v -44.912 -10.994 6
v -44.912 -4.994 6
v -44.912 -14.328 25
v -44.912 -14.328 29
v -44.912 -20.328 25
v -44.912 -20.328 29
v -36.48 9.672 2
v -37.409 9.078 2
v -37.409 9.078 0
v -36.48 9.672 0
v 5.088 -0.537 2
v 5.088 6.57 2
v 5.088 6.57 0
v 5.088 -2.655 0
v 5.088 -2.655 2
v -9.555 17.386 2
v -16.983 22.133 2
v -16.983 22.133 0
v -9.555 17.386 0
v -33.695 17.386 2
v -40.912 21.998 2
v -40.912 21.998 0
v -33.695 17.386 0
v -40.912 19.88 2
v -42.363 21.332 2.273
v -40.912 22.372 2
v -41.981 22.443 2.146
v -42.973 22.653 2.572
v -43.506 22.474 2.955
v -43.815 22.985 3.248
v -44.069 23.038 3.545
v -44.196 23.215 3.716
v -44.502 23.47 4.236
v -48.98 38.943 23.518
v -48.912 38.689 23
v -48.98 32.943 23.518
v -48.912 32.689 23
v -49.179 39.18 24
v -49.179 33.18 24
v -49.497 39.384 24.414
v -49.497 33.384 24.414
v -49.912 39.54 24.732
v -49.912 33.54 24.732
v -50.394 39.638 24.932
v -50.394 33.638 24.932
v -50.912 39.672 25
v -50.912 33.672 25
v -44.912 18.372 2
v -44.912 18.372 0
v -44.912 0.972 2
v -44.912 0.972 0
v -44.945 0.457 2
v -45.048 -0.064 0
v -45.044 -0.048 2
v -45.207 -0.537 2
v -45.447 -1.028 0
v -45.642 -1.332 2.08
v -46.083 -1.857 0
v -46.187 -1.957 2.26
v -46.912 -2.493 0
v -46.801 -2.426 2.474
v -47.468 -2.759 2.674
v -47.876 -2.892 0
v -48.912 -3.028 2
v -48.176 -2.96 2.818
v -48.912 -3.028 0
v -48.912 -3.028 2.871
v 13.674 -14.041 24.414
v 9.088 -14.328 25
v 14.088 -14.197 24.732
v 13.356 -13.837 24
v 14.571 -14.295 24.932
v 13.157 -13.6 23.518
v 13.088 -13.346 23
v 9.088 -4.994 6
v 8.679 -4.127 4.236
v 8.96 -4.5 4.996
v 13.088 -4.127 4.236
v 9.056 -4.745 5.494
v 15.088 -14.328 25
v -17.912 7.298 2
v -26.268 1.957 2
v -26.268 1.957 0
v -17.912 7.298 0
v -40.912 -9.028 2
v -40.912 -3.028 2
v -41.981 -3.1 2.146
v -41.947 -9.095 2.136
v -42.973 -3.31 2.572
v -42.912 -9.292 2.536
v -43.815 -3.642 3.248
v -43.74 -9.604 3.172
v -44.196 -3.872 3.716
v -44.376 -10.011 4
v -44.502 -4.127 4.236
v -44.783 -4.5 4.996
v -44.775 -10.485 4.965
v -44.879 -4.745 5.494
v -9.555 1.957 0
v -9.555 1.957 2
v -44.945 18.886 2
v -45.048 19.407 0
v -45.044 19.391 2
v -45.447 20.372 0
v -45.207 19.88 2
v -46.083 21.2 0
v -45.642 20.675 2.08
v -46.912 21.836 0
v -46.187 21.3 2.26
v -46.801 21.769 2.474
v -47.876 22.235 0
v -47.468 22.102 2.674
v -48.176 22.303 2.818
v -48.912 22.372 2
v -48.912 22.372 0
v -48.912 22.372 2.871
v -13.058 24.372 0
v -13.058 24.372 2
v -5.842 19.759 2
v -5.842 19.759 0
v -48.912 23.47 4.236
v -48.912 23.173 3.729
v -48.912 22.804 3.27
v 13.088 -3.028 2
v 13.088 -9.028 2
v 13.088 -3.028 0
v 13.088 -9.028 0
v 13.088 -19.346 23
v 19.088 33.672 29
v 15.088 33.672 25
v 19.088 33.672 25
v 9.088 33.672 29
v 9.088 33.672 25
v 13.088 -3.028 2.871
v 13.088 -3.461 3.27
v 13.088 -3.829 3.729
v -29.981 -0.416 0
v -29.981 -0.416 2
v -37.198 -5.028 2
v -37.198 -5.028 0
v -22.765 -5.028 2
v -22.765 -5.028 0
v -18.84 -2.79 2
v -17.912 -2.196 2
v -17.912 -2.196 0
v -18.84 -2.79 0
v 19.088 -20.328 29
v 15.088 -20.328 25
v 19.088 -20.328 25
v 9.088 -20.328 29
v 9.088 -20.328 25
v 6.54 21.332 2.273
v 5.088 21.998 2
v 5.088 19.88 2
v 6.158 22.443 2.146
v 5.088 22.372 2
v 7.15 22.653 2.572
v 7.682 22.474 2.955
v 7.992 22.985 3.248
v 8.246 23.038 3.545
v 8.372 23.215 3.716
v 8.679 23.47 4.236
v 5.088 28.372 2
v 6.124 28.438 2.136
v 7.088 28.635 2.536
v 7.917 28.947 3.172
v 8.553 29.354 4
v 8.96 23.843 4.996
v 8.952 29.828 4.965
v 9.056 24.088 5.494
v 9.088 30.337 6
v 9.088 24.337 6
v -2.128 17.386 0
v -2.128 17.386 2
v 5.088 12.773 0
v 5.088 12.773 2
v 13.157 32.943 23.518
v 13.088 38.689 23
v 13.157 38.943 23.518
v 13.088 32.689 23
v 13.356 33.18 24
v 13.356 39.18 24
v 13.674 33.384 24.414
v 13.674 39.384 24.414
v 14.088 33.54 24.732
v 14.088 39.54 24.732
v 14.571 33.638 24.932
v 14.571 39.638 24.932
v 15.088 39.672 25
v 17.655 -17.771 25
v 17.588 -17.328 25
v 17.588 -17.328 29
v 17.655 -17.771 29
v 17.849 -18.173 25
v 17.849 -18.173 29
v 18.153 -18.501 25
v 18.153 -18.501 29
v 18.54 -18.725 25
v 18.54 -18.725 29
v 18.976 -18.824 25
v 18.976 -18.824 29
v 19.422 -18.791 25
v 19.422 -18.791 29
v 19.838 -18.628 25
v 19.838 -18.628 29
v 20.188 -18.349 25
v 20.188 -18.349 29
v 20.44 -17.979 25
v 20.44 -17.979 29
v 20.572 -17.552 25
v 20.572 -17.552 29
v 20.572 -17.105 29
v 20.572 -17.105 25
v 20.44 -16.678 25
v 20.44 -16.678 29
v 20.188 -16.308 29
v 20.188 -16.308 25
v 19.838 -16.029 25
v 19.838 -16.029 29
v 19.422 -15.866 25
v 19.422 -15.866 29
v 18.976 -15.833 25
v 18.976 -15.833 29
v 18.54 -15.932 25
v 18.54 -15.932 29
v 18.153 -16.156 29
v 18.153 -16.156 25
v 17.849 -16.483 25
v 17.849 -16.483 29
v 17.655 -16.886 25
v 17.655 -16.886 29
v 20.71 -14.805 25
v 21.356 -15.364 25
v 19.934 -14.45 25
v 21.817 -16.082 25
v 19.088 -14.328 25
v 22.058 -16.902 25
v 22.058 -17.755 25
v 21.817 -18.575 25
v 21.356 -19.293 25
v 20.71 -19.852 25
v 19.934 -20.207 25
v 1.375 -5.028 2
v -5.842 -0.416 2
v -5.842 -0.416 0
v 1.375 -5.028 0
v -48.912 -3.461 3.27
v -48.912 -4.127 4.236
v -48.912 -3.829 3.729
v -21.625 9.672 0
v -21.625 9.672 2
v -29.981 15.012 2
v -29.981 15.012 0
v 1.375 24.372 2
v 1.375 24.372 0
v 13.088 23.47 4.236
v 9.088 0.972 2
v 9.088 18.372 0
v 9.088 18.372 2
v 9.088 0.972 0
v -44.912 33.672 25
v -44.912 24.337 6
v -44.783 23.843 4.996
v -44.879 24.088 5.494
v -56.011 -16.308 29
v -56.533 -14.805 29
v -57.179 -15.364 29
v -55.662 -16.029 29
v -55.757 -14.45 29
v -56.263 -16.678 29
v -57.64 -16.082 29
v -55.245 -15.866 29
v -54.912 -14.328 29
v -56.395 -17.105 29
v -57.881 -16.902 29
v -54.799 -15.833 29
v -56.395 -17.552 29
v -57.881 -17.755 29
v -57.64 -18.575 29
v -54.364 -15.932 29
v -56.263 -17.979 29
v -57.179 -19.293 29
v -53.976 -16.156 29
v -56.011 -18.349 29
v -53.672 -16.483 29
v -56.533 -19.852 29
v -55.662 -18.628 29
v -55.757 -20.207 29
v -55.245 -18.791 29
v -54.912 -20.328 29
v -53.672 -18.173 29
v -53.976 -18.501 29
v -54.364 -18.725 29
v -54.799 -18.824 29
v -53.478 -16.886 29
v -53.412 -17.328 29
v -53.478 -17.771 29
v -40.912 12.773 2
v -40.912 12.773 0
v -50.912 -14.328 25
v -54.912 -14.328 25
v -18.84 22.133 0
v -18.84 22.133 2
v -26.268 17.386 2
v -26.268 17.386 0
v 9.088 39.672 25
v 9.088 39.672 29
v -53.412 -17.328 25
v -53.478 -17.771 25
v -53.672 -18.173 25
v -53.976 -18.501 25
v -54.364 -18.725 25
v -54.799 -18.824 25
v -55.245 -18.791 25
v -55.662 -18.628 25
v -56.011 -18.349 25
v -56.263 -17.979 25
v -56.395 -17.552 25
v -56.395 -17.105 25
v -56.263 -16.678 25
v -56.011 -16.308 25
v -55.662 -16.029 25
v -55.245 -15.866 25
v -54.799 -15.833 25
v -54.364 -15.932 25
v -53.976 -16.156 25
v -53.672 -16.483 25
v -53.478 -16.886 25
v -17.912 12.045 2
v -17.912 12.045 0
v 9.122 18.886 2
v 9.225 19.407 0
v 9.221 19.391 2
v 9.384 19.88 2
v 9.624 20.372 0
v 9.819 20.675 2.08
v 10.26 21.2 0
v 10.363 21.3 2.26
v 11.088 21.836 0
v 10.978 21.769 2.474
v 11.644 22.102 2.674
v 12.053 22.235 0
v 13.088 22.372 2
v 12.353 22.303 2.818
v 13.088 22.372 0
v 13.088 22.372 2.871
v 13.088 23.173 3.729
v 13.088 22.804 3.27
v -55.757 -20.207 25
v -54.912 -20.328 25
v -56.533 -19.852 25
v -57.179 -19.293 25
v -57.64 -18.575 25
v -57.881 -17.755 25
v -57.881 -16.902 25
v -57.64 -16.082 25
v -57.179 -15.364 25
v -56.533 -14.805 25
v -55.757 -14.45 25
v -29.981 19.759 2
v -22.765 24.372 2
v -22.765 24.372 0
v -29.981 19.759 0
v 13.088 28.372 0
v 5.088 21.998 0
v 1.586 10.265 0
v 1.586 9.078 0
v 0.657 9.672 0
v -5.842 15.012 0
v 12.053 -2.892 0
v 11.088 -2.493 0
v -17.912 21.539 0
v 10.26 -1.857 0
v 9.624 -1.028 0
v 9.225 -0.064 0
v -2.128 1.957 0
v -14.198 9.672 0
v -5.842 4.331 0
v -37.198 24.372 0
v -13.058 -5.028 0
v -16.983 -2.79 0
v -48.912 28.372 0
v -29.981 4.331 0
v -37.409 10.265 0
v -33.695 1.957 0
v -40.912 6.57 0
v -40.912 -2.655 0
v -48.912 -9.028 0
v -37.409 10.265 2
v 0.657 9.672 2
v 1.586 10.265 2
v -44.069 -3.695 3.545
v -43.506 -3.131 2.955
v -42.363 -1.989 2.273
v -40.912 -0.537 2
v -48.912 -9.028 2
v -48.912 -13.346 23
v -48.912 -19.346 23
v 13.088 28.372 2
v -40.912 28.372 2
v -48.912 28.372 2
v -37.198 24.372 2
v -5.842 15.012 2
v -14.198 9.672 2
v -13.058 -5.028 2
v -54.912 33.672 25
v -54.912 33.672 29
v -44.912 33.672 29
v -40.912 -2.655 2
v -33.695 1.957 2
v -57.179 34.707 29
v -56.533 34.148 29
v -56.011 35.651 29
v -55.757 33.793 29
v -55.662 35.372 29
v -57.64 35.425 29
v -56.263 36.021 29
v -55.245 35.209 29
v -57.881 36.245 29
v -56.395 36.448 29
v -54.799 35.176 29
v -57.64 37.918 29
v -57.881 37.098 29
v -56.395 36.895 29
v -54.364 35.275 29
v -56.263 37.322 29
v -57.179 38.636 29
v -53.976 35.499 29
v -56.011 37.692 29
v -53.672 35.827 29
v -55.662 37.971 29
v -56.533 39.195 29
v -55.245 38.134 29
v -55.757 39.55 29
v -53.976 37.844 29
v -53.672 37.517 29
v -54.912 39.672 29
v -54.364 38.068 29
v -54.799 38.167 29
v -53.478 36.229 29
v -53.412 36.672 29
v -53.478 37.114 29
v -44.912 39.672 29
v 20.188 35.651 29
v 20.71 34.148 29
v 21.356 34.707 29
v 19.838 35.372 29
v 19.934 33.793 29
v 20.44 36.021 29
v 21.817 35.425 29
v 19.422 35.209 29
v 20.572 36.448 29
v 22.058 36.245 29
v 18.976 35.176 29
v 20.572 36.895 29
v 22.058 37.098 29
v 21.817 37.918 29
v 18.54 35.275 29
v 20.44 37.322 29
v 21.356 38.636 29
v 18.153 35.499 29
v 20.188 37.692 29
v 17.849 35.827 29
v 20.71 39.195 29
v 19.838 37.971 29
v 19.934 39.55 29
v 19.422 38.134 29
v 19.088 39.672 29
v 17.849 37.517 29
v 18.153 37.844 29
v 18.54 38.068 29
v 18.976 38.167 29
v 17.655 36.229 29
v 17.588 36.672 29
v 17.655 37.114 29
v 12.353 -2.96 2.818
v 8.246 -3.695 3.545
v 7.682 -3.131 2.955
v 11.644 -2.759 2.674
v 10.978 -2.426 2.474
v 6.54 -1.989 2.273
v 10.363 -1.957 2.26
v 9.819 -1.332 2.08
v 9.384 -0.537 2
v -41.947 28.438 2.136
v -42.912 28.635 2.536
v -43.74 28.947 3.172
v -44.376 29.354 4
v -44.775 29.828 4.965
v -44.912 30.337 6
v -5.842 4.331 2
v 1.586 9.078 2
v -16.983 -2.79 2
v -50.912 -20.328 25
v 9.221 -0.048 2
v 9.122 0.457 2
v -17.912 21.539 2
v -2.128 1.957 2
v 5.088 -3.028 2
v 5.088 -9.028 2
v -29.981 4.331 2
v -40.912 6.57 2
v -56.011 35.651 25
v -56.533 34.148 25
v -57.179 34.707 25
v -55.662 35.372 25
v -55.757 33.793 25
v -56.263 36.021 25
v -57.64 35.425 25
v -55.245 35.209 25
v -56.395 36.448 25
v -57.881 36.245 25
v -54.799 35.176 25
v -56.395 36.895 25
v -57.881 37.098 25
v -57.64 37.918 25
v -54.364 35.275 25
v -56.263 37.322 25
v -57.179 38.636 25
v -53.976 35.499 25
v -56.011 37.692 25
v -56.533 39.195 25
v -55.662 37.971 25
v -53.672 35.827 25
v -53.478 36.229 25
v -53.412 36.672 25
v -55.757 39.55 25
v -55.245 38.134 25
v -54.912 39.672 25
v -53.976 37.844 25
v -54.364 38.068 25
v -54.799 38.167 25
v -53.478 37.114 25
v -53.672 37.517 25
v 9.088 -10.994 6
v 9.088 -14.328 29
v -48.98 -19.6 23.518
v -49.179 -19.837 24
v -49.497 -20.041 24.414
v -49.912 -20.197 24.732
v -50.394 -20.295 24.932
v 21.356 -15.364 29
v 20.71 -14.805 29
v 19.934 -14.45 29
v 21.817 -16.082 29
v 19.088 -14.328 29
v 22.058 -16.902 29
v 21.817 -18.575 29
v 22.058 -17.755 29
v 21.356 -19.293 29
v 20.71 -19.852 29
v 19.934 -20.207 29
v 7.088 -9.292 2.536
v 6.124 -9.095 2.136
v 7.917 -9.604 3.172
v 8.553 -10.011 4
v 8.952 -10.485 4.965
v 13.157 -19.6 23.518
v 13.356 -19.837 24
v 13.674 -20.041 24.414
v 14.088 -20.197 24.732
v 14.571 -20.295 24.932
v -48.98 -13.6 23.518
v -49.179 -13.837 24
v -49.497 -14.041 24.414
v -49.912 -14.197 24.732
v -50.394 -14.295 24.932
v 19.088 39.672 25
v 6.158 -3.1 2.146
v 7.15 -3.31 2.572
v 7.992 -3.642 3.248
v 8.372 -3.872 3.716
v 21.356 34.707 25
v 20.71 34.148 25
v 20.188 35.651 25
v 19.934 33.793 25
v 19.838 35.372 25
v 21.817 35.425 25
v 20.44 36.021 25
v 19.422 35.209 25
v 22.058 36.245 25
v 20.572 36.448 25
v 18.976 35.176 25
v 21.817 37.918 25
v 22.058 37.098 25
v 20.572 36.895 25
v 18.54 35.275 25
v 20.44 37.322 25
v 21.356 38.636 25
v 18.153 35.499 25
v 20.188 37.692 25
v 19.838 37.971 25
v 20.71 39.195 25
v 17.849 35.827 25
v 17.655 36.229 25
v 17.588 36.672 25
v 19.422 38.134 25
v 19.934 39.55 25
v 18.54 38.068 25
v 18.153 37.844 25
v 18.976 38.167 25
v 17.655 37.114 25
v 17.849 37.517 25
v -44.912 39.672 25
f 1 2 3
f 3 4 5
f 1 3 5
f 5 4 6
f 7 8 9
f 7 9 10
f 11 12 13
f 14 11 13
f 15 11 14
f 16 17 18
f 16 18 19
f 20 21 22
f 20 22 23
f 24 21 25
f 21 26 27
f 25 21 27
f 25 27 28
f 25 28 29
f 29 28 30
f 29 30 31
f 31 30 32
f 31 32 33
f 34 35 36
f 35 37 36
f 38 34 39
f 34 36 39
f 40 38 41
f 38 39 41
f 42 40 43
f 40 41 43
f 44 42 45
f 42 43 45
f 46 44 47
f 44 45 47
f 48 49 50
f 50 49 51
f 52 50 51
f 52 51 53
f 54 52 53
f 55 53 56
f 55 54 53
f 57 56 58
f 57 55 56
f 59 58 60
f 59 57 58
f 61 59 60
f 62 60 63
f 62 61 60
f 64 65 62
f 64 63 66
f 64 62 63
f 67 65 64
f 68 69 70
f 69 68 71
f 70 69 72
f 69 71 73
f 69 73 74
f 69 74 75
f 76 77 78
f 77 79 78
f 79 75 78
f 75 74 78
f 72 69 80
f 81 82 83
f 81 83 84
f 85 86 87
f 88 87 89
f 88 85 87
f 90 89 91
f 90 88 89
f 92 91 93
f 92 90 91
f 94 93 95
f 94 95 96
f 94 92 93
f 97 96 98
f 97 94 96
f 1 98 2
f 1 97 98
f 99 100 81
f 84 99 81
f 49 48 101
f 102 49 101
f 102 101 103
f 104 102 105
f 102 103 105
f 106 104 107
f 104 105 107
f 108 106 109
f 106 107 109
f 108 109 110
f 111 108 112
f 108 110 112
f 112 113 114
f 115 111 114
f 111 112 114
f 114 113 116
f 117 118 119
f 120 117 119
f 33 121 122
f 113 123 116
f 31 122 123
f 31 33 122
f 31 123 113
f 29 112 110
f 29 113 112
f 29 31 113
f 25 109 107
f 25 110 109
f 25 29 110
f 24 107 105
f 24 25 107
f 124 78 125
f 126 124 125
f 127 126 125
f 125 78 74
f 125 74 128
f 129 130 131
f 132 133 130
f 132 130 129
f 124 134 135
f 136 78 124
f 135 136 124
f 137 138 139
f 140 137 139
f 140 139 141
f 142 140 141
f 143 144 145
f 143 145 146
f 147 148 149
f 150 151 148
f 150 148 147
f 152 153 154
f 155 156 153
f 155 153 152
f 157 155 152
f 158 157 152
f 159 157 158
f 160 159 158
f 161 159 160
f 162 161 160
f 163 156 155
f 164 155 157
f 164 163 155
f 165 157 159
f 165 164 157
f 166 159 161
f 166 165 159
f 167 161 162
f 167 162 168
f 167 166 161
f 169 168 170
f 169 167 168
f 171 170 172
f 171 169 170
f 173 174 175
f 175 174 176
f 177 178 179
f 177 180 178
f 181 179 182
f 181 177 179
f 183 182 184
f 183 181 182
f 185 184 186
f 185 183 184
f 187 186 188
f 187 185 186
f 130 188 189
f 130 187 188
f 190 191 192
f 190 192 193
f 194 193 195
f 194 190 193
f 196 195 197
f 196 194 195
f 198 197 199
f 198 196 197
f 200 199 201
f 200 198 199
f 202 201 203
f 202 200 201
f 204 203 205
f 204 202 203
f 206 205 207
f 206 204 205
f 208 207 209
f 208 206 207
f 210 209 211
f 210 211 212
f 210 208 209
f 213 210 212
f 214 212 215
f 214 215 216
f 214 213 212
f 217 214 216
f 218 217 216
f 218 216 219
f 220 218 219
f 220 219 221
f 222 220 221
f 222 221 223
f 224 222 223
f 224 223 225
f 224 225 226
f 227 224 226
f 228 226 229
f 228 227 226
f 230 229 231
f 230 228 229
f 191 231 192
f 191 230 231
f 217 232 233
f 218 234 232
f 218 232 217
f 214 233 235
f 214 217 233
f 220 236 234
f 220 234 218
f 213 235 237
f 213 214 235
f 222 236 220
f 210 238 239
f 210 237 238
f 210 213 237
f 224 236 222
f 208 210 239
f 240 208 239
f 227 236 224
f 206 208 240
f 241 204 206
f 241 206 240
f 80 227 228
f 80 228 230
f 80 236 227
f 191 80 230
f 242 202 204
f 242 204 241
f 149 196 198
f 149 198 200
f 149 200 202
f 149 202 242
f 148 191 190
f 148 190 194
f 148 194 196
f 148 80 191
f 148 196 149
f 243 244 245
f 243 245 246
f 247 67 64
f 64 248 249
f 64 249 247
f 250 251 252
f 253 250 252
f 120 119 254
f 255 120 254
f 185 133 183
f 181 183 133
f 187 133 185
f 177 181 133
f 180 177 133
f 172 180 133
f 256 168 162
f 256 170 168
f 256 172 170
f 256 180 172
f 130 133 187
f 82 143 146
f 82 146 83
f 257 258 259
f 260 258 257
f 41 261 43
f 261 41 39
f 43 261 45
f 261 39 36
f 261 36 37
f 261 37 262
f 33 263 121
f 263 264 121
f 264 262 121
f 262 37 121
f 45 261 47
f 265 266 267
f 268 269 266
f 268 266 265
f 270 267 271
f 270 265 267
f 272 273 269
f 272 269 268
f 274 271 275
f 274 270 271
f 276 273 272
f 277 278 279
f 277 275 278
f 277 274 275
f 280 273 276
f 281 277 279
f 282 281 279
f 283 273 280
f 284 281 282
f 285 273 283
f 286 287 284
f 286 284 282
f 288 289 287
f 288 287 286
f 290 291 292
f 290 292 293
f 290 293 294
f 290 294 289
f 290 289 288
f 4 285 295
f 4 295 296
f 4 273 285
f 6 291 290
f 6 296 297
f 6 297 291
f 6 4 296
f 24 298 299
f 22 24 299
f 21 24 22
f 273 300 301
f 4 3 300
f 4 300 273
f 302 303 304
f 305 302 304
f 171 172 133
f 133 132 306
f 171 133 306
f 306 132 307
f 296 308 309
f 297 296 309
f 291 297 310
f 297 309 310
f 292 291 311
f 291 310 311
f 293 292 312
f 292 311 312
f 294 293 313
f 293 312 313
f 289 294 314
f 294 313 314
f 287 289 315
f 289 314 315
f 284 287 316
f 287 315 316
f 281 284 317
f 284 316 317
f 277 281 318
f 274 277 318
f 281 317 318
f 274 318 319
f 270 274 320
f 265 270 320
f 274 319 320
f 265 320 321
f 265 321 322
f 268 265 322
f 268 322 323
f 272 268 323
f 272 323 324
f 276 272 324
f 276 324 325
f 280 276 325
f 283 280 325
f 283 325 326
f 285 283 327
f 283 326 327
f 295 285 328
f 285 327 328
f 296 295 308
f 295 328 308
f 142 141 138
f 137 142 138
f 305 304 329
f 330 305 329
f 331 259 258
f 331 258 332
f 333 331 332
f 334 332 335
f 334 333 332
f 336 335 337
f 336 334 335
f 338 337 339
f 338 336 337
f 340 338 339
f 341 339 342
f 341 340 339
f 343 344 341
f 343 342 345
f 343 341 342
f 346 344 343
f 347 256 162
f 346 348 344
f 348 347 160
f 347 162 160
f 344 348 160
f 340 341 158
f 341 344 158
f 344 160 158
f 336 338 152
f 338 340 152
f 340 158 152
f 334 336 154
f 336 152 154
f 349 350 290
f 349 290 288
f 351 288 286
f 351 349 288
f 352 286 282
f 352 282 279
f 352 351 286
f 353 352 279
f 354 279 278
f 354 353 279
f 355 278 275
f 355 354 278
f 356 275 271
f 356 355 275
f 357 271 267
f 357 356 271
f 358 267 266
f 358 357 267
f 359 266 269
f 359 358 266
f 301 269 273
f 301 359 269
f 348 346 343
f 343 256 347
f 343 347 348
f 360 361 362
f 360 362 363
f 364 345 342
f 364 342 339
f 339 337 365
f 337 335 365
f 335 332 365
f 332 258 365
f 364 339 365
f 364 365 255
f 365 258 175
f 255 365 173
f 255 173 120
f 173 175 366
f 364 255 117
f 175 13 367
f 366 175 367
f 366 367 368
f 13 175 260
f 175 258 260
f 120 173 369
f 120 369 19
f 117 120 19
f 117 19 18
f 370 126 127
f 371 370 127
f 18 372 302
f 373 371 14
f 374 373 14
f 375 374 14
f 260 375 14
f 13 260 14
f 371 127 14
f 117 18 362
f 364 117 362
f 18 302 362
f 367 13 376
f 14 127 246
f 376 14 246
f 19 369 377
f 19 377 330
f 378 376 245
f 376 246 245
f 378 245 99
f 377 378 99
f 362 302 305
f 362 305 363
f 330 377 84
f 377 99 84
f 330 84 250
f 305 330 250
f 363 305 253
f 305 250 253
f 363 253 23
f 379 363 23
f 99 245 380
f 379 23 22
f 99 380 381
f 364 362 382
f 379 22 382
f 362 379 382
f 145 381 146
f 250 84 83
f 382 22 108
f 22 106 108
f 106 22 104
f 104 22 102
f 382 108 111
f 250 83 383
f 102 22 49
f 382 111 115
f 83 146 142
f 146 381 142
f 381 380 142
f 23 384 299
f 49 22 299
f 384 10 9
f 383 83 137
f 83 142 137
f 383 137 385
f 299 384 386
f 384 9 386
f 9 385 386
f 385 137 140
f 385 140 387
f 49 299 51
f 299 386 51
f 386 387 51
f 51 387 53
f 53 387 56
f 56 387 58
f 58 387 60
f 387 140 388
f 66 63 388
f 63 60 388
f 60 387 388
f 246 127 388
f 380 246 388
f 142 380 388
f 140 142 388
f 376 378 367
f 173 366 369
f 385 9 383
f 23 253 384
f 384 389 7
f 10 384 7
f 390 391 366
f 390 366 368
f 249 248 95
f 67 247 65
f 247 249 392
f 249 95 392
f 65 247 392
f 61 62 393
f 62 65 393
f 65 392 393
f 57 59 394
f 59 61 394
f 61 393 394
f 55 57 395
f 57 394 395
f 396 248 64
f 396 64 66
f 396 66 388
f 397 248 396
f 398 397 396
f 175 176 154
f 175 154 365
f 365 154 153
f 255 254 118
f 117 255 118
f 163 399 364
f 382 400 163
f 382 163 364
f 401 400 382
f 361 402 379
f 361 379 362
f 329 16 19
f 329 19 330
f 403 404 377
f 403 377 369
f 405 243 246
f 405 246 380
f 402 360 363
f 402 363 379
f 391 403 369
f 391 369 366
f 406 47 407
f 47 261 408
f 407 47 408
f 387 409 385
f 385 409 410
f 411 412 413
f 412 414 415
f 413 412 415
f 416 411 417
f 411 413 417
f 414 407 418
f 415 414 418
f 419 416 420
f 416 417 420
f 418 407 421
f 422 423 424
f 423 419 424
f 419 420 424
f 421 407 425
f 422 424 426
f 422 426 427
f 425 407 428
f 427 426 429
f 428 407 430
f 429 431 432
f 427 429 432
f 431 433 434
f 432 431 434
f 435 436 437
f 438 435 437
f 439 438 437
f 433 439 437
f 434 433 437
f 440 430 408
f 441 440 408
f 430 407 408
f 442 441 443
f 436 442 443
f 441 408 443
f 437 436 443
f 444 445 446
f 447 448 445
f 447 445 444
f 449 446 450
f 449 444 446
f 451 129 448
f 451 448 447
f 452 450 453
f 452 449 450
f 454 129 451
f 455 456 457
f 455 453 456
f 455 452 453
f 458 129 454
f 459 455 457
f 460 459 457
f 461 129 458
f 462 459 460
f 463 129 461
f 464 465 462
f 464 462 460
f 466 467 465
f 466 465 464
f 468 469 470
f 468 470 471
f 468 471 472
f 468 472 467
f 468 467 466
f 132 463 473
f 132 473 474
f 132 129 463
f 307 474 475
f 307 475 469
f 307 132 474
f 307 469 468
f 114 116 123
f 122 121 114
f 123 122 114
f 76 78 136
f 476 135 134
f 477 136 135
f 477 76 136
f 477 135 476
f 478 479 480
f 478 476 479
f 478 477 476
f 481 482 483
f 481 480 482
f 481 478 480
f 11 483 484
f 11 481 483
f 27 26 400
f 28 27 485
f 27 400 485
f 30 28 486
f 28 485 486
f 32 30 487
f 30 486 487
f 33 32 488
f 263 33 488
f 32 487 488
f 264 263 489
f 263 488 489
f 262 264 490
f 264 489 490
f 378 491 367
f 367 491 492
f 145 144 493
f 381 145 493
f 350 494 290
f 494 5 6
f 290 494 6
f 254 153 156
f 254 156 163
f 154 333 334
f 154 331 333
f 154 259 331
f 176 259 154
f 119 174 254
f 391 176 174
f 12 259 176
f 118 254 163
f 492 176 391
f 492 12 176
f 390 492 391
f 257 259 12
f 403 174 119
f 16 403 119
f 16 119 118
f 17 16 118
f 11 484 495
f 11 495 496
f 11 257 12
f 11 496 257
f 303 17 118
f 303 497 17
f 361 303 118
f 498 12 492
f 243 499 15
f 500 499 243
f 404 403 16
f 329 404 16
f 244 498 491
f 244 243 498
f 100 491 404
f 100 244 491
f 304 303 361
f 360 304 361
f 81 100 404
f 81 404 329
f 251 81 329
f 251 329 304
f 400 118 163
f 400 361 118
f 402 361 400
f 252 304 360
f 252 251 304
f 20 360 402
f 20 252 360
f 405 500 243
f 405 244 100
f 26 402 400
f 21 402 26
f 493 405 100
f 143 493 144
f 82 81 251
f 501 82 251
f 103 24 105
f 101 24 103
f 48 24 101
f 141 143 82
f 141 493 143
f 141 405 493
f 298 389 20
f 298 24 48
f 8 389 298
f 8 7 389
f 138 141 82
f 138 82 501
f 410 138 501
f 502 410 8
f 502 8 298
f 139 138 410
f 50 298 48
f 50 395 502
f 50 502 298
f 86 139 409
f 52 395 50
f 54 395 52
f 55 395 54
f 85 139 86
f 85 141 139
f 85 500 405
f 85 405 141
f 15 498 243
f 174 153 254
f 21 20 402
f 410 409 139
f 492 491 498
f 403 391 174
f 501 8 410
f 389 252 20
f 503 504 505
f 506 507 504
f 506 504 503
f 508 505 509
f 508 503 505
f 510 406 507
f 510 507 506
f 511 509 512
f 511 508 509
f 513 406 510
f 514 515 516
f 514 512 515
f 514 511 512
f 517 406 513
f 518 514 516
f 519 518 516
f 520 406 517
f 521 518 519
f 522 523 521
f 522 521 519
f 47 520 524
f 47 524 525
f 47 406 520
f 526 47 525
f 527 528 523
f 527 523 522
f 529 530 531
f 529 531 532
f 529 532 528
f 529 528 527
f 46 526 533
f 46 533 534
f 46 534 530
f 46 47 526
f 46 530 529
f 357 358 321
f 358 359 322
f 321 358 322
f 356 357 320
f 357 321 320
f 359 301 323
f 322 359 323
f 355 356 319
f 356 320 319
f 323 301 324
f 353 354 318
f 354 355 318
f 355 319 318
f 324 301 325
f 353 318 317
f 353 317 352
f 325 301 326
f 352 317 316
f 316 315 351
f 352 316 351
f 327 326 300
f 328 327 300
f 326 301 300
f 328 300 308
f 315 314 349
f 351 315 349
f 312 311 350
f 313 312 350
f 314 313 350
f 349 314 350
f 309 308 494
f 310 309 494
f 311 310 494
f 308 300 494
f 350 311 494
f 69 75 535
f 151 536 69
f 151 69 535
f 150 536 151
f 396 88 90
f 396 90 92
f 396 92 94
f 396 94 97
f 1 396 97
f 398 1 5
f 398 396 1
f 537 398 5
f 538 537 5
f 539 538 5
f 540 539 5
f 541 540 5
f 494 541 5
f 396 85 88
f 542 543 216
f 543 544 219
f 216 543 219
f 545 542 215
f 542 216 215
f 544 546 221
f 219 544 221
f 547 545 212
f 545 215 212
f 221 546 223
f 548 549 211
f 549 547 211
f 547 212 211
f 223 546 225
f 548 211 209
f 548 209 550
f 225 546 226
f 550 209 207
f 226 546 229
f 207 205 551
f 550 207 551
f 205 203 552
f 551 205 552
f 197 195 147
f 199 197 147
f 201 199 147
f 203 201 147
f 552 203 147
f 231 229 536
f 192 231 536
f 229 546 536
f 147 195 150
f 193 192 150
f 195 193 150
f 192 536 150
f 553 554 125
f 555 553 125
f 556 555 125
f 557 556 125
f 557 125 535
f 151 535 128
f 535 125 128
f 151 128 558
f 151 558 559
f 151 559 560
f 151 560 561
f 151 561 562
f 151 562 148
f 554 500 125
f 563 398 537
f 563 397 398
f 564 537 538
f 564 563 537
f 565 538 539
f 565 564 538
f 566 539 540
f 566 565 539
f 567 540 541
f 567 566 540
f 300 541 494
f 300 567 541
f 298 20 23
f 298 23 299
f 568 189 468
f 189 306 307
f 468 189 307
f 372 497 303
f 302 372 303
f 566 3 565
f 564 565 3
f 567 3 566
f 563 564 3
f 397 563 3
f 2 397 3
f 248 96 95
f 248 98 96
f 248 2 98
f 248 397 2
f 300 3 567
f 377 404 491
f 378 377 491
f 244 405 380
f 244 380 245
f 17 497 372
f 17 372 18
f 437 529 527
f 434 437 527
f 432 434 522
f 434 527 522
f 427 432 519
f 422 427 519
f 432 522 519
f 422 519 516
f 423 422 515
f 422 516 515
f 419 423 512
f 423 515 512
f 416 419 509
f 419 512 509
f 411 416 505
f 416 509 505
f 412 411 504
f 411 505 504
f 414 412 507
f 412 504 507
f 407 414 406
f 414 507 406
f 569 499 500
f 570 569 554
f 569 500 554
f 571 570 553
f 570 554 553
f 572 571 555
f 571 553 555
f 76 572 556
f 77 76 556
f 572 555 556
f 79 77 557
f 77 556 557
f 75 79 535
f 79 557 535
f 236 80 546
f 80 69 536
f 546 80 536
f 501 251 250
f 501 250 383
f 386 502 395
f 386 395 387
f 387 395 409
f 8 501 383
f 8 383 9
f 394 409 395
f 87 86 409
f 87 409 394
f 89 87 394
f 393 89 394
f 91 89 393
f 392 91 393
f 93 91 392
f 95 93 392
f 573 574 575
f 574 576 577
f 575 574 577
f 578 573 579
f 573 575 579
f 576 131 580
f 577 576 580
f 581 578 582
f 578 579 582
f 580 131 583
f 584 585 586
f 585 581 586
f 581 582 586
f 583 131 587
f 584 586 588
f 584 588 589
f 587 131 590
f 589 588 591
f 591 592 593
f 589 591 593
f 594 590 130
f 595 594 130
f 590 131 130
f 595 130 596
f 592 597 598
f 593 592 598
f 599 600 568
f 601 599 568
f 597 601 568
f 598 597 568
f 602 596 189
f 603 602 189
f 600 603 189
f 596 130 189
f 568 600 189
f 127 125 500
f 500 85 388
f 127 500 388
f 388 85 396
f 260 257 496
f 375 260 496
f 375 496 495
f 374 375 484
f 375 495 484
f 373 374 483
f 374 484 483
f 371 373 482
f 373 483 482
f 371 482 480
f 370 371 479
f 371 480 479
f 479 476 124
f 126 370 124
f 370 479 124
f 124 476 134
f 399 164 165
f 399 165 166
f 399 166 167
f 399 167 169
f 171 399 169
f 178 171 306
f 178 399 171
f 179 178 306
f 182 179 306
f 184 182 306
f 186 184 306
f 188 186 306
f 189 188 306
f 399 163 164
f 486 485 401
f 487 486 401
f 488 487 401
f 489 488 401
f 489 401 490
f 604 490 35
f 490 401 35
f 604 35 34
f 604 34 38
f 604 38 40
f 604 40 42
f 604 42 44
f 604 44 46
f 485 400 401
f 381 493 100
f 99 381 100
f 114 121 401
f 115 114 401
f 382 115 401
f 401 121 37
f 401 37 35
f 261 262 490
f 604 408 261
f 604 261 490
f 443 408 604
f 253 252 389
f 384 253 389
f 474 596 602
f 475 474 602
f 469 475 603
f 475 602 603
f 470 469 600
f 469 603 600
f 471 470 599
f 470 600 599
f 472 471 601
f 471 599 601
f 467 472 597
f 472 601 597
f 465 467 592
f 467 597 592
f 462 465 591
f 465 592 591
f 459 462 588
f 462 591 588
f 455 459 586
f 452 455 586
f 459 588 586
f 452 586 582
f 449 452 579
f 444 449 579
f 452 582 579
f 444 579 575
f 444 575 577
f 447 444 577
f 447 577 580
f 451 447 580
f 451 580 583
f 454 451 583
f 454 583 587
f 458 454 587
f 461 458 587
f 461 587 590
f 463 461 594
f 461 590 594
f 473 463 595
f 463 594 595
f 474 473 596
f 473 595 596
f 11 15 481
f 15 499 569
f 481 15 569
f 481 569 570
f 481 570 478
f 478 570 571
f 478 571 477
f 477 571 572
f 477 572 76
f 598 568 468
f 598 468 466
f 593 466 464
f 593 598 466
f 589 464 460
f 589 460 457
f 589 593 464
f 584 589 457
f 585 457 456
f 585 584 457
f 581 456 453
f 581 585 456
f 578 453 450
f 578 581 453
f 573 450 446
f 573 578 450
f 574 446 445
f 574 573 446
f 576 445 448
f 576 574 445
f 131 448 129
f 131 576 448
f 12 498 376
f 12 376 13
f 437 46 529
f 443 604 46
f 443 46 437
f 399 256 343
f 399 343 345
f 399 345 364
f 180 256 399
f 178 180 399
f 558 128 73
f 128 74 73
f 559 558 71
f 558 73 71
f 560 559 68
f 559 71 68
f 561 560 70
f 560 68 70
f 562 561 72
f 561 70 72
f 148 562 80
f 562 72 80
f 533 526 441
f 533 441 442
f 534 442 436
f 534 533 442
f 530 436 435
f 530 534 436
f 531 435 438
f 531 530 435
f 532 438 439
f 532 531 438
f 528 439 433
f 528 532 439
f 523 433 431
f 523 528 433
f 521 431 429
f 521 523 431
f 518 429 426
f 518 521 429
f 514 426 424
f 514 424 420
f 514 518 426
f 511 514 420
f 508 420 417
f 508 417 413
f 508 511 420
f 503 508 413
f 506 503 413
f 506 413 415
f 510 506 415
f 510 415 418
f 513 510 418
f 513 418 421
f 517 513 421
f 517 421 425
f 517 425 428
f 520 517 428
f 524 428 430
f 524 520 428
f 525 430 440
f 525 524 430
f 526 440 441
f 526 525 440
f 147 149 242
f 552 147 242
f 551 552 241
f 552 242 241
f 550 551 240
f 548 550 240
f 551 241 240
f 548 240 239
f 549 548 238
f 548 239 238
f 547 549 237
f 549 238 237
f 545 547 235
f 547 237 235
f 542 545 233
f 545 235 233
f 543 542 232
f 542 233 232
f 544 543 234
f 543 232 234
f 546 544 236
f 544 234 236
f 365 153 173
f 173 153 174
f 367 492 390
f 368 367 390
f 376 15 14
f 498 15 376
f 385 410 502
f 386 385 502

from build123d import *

# Parameters (mm, degrees)
SKETCH1_W                = 54
SKETCH1_H                = 37.4
BOSS_EXTRUDE1_DEPTH      = 2
CUT_EXTRUDE1_DEPTH       = 54.160020758
SKETCH4_R                = 3
SKETCH4_R_2              = 1.5
BOSS_EXTRUDE2_DEPTH      = 4
BOSS_EXTRUDE3_REACH      = 75.013
BOSS_EXTRUDE3_END_RADIUS = 3
SKETCH6_W                = 4
SKETCH6_H                = 6
LOFT1_START              = -48.911518112
LOFT1_DEPTH              = 4
SKETCH8_2_W              = 4
SKETCH8_2_H              = 6
BOSS_EXTRUDE4_DEPTH      = 2
FILLET5_R                = 2
FILLET1_R                = 4
FILLET2_R                = 4
FILLET3_R                = 4
INTERSECT1_START         = -9.028476462
INTERSECT1_OUTLINE_W     = 54
INTERSECT1_OUTLINE_H     = 2
INTERSECT1_DEPTH         = 18.7
INTERSECT2_START         = -17.911518112
INTERSECT2_OUTLINE_W     = 18.7
INTERSECT2_OUTLINE_H     = 2
INTERSECT2_DEPTH         = 27


# Read off the part's stored shape, not the designer's step: Loft1, Intersect1, Intersect2
with BuildPart() as part:
    # Sketch1 → Boss-Extrude1 (new body)
    with BuildSketch(Plane.XY):
        with Locations((-17.911518112, 9.671523538)):
            Rectangle(SKETCH1_W, SKETCH1_H)
    extrude(amount=BOSS_EXTRUDE1_DEPTH)

    # Sketch2 → Cut-Extrude1 (cut, through all)
    with BuildSketch(Plane.XY.offset(2)):
        Polygon((-22.764922959, 24.371523538), (-29.981326879, 19.759300163), (-37.197730799, 24.371523538), align=None)
        Polygon((-33.695114192, 17.385705663), (-40.911518112, 12.773482289), (-40.911518112, 21.997929038), align=None)
        Polygon((-29.981326879, 15.012111163), (-37.408901505, 10.264922163), (-29.052880051, 4.924334538), (-21.625305425, 9.671523538), align=None)
        Polygon((-18.83996494, 22.132894663), (-26.267539566, 17.385705663), (-17.911518112, 12.045118038), (-10.483943486, 16.792307038), align=None)
        Polygon((1.374694575, 24.371523538), (-14.915006921, 24.371523538), (-6.770156173, 19.165901538), align=None)
        Polygon((-3.05636886, 16.792307038), (5.088481888, 11.586685039), (5.088481888, 21.997929038), align=None)
        Polygon((-6.770156173, 14.418712538), (-14.197730799, 9.671523538), (-5.841709344, 4.330935913), (1.585865282, 9.078124913), align=None)
        Polygon((-17.911518112, 7.297929038), (-25.339092738, 2.550740038), (-16.983071283, -2.789847587), (-9.555496657, 1.957341413), align=None)
        Polygon((-29.052880051, 0.177145538), (-20.908029303, -5.028476462), (-37.197730799, -5.028476462), align=None)
        Polygon((-40.911518112, 7.756362038), (-32.766667364, 2.550740038), (-40.911518112, -2.654881962), align=None)
        Polygon((-13.058113264, -5.028476462), (-5.841709344, -0.416253087), (1.374694575, -5.028476462), align=None)
        Polygon((-2.127922031, 1.957341413), (5.088481888, 6.569564788), (5.088481888, -2.654881962), align=None)
    extrude(amount=-CUT_EXTRUDE1_DEPTH, mode=Mode.SUBTRACT)



with BuildPart() as body_2:
    # Sketch4 → Boss-Extrude2 (new body)
    with BuildSketch(Plane.XY.offset(25)):
        with Locations((-54.911518112, 36.671523538)):
            Circle(SKETCH4_R)
        with Locations((-54.911518112, 36.671523538)):
            Circle(SKETCH4_R_2, mode=Mode.SUBTRACT)
    extrude(amount=BOSS_EXTRUDE2_DEPTH)

    # Boss-Extrude3: up to this cylinder (the profile starts outside it)
    boss_extrude3_end = Plane(origin=(-54.911518112, 36.671523538, 27), z_dir=(0, 0, -1)) * Cylinder(BOSS_EXTRUDE3_END_RADIUS, 157.026, mode=Mode.PRIVATE)
    # Sketch6 → Boss-Extrude3 (add, up to the surface)
    with BuildSketch(Plane.ZY.offset(44.911518112), mode=Mode.PRIVATE) as boss_extrude3_sk1:
        with Locations((27, 36.671523538)):
            Rectangle(SKETCH6_W, SKETCH6_H)
    boss_extrude3_tool1 = extrude(boss_extrude3_sk1.sketch, amount=BOSS_EXTRUDE3_REACH, mode=Mode.PRIVATE) - boss_extrude3_end
    add(boss_extrude3_tool1.solids().sort_by_distance((-44.911518, 36.671524, 27))[0])

    # Loft1 outline → Loft1 (add)
    with BuildSketch(Plane.YZ.offset(LOFT1_START)):
        Polygon((22.371523538, 2), (28.371523538, 2), (39.671523538, 25), (33.671523538, 25), align=None)
    extrude(amount=LOFT1_DEPTH)


with BuildPart() as part_1:
    add(part.part)

    add(body_2.part)  # Boss-Extrude4 merges body 2
    # Sketch8<2> → Boss-Extrude4 (add)
    with BuildSketch(Plane.XY.offset(2)):
        with Locations((-46.911518112, 25.371523538)):
            Rectangle(SKETCH8_2_W, SKETCH8_2_H)
    extrude(amount=-BOSS_EXTRUDE4_DEPTH)

    # Fillet5
    fillet5_edges = [part_1.edges().sort_by_distance(p)[0] for p in [
        (-48.911518112, 36.671523538, 25),
    ]]
    fillet(fillet5_edges, radius=FILLET5_R)

    # Fillet1
    # the kernel refuses this fillet: 4 mm, written as the material it adds along each edge
    with BuildSketch(Plane(origin=(-44.911518112, 22.371523538, 2), x_dir=(-1, 0, 0), z_dir=(0, 0, -1))) as fillet1_piece_1:
        with BuildLine():
            CenterArc((FILLET1_R, -FILLET1_R), FILLET1_R, 90, 90)
            Line((0, -FILLET1_R), (0, 0))
            Line((0, 0), (FILLET1_R, 0))
        make_face()
    extrude(amount=2)

    # Fillet2
    fillet2_edges = [part_1.edges().sort_by_distance(p)[0] for p in [
        (-44.911518112, 25.371523538, 2),
    ]]
    fillet(fillet2_edges, radius=FILLET2_R)

    # Fillet3
    # the kernel refuses this fillet: 4 mm, written as the material it adds along each edge
    with BuildSketch(Plane(origin=(-40.911518112, 22.371523538, 2), x_dir=(-1.1887379968908428e-11, -1.0, 0), z_dir=(-1.0, 1.188737996890843e-11, 0))) as fillet3_piece_1_section:
        with BuildLine():
            CenterArc((FILLET3_R * 0.622867973762, FILLET3_R), FILLET3_R, 206.165087136, 63.834912864)
            Line((-FILLET3_R * 0.274659258448, FILLET3_R * 0.559040968523), (0, 0))
            Line((0, 0), (FILLET3_R * 0.622867973762, 0))
        make_face()
    fillet3_piece_1 = extrude(amount=8, mode=Mode.PRIVATE)
    fillet3_piece_1 = fillet3_piece_1 - Plane(origin=(-48.911518112, 18.371523538, 2.009489355), x_dir=(-1, 0, 0), z_dir=(0, 0, 1)) * Cylinder(4, 26, mode=Mode.PRIVATE)
    fillet3_piece_1 = fillet3_piece_1 - Plane(origin=(-40.911518112, 22.302452917, 6), x_dir=(0, 0, -1), z_dir=(0, 1, 0)) * Cylinder(4, 26, mode=Mode.PRIVATE)
    add(fillet3_piece_1)

    # Intersect1 outline → Intersect1 (cut)
    with BuildSketch(Plane(origin=(0, 0, 0), x_dir=(1, 0, 0), z_dir=(0, 1, 0)).offset(INTERSECT1_START)):
        with Locations((-17.911518112, -1)):
            Rectangle(INTERSECT1_OUTLINE_W, INTERSECT1_OUTLINE_H)
    extrude(amount=INTERSECT1_DEPTH, mode=Mode.SUBTRACT)

    # Intersect2 outline → Intersect2 (cut)
    with BuildSketch(Plane.YZ.offset(INTERSECT2_START)):
        with Locations((19.021523538, 1)):
            Rectangle(INTERSECT2_OUTLINE_W, INTERSECT2_OUTLINE_H)
    extrude(amount=INTERSECT2_DEPTH, mode=Mode.SUBTRACT)

    # Mirror3: part across plane


with BuildPart() as part_2:
    add(part_1.part)
    add(part_1.part.mirror(Plane.ZY.offset(17.911518112)))

    # Mirror4: part across plane


with BuildPart() as part_3:
    add(part_2.part)
    add(part_2.part.mirror(Plane.ZX.offset(9.671523538)))


solid = part_3.part
